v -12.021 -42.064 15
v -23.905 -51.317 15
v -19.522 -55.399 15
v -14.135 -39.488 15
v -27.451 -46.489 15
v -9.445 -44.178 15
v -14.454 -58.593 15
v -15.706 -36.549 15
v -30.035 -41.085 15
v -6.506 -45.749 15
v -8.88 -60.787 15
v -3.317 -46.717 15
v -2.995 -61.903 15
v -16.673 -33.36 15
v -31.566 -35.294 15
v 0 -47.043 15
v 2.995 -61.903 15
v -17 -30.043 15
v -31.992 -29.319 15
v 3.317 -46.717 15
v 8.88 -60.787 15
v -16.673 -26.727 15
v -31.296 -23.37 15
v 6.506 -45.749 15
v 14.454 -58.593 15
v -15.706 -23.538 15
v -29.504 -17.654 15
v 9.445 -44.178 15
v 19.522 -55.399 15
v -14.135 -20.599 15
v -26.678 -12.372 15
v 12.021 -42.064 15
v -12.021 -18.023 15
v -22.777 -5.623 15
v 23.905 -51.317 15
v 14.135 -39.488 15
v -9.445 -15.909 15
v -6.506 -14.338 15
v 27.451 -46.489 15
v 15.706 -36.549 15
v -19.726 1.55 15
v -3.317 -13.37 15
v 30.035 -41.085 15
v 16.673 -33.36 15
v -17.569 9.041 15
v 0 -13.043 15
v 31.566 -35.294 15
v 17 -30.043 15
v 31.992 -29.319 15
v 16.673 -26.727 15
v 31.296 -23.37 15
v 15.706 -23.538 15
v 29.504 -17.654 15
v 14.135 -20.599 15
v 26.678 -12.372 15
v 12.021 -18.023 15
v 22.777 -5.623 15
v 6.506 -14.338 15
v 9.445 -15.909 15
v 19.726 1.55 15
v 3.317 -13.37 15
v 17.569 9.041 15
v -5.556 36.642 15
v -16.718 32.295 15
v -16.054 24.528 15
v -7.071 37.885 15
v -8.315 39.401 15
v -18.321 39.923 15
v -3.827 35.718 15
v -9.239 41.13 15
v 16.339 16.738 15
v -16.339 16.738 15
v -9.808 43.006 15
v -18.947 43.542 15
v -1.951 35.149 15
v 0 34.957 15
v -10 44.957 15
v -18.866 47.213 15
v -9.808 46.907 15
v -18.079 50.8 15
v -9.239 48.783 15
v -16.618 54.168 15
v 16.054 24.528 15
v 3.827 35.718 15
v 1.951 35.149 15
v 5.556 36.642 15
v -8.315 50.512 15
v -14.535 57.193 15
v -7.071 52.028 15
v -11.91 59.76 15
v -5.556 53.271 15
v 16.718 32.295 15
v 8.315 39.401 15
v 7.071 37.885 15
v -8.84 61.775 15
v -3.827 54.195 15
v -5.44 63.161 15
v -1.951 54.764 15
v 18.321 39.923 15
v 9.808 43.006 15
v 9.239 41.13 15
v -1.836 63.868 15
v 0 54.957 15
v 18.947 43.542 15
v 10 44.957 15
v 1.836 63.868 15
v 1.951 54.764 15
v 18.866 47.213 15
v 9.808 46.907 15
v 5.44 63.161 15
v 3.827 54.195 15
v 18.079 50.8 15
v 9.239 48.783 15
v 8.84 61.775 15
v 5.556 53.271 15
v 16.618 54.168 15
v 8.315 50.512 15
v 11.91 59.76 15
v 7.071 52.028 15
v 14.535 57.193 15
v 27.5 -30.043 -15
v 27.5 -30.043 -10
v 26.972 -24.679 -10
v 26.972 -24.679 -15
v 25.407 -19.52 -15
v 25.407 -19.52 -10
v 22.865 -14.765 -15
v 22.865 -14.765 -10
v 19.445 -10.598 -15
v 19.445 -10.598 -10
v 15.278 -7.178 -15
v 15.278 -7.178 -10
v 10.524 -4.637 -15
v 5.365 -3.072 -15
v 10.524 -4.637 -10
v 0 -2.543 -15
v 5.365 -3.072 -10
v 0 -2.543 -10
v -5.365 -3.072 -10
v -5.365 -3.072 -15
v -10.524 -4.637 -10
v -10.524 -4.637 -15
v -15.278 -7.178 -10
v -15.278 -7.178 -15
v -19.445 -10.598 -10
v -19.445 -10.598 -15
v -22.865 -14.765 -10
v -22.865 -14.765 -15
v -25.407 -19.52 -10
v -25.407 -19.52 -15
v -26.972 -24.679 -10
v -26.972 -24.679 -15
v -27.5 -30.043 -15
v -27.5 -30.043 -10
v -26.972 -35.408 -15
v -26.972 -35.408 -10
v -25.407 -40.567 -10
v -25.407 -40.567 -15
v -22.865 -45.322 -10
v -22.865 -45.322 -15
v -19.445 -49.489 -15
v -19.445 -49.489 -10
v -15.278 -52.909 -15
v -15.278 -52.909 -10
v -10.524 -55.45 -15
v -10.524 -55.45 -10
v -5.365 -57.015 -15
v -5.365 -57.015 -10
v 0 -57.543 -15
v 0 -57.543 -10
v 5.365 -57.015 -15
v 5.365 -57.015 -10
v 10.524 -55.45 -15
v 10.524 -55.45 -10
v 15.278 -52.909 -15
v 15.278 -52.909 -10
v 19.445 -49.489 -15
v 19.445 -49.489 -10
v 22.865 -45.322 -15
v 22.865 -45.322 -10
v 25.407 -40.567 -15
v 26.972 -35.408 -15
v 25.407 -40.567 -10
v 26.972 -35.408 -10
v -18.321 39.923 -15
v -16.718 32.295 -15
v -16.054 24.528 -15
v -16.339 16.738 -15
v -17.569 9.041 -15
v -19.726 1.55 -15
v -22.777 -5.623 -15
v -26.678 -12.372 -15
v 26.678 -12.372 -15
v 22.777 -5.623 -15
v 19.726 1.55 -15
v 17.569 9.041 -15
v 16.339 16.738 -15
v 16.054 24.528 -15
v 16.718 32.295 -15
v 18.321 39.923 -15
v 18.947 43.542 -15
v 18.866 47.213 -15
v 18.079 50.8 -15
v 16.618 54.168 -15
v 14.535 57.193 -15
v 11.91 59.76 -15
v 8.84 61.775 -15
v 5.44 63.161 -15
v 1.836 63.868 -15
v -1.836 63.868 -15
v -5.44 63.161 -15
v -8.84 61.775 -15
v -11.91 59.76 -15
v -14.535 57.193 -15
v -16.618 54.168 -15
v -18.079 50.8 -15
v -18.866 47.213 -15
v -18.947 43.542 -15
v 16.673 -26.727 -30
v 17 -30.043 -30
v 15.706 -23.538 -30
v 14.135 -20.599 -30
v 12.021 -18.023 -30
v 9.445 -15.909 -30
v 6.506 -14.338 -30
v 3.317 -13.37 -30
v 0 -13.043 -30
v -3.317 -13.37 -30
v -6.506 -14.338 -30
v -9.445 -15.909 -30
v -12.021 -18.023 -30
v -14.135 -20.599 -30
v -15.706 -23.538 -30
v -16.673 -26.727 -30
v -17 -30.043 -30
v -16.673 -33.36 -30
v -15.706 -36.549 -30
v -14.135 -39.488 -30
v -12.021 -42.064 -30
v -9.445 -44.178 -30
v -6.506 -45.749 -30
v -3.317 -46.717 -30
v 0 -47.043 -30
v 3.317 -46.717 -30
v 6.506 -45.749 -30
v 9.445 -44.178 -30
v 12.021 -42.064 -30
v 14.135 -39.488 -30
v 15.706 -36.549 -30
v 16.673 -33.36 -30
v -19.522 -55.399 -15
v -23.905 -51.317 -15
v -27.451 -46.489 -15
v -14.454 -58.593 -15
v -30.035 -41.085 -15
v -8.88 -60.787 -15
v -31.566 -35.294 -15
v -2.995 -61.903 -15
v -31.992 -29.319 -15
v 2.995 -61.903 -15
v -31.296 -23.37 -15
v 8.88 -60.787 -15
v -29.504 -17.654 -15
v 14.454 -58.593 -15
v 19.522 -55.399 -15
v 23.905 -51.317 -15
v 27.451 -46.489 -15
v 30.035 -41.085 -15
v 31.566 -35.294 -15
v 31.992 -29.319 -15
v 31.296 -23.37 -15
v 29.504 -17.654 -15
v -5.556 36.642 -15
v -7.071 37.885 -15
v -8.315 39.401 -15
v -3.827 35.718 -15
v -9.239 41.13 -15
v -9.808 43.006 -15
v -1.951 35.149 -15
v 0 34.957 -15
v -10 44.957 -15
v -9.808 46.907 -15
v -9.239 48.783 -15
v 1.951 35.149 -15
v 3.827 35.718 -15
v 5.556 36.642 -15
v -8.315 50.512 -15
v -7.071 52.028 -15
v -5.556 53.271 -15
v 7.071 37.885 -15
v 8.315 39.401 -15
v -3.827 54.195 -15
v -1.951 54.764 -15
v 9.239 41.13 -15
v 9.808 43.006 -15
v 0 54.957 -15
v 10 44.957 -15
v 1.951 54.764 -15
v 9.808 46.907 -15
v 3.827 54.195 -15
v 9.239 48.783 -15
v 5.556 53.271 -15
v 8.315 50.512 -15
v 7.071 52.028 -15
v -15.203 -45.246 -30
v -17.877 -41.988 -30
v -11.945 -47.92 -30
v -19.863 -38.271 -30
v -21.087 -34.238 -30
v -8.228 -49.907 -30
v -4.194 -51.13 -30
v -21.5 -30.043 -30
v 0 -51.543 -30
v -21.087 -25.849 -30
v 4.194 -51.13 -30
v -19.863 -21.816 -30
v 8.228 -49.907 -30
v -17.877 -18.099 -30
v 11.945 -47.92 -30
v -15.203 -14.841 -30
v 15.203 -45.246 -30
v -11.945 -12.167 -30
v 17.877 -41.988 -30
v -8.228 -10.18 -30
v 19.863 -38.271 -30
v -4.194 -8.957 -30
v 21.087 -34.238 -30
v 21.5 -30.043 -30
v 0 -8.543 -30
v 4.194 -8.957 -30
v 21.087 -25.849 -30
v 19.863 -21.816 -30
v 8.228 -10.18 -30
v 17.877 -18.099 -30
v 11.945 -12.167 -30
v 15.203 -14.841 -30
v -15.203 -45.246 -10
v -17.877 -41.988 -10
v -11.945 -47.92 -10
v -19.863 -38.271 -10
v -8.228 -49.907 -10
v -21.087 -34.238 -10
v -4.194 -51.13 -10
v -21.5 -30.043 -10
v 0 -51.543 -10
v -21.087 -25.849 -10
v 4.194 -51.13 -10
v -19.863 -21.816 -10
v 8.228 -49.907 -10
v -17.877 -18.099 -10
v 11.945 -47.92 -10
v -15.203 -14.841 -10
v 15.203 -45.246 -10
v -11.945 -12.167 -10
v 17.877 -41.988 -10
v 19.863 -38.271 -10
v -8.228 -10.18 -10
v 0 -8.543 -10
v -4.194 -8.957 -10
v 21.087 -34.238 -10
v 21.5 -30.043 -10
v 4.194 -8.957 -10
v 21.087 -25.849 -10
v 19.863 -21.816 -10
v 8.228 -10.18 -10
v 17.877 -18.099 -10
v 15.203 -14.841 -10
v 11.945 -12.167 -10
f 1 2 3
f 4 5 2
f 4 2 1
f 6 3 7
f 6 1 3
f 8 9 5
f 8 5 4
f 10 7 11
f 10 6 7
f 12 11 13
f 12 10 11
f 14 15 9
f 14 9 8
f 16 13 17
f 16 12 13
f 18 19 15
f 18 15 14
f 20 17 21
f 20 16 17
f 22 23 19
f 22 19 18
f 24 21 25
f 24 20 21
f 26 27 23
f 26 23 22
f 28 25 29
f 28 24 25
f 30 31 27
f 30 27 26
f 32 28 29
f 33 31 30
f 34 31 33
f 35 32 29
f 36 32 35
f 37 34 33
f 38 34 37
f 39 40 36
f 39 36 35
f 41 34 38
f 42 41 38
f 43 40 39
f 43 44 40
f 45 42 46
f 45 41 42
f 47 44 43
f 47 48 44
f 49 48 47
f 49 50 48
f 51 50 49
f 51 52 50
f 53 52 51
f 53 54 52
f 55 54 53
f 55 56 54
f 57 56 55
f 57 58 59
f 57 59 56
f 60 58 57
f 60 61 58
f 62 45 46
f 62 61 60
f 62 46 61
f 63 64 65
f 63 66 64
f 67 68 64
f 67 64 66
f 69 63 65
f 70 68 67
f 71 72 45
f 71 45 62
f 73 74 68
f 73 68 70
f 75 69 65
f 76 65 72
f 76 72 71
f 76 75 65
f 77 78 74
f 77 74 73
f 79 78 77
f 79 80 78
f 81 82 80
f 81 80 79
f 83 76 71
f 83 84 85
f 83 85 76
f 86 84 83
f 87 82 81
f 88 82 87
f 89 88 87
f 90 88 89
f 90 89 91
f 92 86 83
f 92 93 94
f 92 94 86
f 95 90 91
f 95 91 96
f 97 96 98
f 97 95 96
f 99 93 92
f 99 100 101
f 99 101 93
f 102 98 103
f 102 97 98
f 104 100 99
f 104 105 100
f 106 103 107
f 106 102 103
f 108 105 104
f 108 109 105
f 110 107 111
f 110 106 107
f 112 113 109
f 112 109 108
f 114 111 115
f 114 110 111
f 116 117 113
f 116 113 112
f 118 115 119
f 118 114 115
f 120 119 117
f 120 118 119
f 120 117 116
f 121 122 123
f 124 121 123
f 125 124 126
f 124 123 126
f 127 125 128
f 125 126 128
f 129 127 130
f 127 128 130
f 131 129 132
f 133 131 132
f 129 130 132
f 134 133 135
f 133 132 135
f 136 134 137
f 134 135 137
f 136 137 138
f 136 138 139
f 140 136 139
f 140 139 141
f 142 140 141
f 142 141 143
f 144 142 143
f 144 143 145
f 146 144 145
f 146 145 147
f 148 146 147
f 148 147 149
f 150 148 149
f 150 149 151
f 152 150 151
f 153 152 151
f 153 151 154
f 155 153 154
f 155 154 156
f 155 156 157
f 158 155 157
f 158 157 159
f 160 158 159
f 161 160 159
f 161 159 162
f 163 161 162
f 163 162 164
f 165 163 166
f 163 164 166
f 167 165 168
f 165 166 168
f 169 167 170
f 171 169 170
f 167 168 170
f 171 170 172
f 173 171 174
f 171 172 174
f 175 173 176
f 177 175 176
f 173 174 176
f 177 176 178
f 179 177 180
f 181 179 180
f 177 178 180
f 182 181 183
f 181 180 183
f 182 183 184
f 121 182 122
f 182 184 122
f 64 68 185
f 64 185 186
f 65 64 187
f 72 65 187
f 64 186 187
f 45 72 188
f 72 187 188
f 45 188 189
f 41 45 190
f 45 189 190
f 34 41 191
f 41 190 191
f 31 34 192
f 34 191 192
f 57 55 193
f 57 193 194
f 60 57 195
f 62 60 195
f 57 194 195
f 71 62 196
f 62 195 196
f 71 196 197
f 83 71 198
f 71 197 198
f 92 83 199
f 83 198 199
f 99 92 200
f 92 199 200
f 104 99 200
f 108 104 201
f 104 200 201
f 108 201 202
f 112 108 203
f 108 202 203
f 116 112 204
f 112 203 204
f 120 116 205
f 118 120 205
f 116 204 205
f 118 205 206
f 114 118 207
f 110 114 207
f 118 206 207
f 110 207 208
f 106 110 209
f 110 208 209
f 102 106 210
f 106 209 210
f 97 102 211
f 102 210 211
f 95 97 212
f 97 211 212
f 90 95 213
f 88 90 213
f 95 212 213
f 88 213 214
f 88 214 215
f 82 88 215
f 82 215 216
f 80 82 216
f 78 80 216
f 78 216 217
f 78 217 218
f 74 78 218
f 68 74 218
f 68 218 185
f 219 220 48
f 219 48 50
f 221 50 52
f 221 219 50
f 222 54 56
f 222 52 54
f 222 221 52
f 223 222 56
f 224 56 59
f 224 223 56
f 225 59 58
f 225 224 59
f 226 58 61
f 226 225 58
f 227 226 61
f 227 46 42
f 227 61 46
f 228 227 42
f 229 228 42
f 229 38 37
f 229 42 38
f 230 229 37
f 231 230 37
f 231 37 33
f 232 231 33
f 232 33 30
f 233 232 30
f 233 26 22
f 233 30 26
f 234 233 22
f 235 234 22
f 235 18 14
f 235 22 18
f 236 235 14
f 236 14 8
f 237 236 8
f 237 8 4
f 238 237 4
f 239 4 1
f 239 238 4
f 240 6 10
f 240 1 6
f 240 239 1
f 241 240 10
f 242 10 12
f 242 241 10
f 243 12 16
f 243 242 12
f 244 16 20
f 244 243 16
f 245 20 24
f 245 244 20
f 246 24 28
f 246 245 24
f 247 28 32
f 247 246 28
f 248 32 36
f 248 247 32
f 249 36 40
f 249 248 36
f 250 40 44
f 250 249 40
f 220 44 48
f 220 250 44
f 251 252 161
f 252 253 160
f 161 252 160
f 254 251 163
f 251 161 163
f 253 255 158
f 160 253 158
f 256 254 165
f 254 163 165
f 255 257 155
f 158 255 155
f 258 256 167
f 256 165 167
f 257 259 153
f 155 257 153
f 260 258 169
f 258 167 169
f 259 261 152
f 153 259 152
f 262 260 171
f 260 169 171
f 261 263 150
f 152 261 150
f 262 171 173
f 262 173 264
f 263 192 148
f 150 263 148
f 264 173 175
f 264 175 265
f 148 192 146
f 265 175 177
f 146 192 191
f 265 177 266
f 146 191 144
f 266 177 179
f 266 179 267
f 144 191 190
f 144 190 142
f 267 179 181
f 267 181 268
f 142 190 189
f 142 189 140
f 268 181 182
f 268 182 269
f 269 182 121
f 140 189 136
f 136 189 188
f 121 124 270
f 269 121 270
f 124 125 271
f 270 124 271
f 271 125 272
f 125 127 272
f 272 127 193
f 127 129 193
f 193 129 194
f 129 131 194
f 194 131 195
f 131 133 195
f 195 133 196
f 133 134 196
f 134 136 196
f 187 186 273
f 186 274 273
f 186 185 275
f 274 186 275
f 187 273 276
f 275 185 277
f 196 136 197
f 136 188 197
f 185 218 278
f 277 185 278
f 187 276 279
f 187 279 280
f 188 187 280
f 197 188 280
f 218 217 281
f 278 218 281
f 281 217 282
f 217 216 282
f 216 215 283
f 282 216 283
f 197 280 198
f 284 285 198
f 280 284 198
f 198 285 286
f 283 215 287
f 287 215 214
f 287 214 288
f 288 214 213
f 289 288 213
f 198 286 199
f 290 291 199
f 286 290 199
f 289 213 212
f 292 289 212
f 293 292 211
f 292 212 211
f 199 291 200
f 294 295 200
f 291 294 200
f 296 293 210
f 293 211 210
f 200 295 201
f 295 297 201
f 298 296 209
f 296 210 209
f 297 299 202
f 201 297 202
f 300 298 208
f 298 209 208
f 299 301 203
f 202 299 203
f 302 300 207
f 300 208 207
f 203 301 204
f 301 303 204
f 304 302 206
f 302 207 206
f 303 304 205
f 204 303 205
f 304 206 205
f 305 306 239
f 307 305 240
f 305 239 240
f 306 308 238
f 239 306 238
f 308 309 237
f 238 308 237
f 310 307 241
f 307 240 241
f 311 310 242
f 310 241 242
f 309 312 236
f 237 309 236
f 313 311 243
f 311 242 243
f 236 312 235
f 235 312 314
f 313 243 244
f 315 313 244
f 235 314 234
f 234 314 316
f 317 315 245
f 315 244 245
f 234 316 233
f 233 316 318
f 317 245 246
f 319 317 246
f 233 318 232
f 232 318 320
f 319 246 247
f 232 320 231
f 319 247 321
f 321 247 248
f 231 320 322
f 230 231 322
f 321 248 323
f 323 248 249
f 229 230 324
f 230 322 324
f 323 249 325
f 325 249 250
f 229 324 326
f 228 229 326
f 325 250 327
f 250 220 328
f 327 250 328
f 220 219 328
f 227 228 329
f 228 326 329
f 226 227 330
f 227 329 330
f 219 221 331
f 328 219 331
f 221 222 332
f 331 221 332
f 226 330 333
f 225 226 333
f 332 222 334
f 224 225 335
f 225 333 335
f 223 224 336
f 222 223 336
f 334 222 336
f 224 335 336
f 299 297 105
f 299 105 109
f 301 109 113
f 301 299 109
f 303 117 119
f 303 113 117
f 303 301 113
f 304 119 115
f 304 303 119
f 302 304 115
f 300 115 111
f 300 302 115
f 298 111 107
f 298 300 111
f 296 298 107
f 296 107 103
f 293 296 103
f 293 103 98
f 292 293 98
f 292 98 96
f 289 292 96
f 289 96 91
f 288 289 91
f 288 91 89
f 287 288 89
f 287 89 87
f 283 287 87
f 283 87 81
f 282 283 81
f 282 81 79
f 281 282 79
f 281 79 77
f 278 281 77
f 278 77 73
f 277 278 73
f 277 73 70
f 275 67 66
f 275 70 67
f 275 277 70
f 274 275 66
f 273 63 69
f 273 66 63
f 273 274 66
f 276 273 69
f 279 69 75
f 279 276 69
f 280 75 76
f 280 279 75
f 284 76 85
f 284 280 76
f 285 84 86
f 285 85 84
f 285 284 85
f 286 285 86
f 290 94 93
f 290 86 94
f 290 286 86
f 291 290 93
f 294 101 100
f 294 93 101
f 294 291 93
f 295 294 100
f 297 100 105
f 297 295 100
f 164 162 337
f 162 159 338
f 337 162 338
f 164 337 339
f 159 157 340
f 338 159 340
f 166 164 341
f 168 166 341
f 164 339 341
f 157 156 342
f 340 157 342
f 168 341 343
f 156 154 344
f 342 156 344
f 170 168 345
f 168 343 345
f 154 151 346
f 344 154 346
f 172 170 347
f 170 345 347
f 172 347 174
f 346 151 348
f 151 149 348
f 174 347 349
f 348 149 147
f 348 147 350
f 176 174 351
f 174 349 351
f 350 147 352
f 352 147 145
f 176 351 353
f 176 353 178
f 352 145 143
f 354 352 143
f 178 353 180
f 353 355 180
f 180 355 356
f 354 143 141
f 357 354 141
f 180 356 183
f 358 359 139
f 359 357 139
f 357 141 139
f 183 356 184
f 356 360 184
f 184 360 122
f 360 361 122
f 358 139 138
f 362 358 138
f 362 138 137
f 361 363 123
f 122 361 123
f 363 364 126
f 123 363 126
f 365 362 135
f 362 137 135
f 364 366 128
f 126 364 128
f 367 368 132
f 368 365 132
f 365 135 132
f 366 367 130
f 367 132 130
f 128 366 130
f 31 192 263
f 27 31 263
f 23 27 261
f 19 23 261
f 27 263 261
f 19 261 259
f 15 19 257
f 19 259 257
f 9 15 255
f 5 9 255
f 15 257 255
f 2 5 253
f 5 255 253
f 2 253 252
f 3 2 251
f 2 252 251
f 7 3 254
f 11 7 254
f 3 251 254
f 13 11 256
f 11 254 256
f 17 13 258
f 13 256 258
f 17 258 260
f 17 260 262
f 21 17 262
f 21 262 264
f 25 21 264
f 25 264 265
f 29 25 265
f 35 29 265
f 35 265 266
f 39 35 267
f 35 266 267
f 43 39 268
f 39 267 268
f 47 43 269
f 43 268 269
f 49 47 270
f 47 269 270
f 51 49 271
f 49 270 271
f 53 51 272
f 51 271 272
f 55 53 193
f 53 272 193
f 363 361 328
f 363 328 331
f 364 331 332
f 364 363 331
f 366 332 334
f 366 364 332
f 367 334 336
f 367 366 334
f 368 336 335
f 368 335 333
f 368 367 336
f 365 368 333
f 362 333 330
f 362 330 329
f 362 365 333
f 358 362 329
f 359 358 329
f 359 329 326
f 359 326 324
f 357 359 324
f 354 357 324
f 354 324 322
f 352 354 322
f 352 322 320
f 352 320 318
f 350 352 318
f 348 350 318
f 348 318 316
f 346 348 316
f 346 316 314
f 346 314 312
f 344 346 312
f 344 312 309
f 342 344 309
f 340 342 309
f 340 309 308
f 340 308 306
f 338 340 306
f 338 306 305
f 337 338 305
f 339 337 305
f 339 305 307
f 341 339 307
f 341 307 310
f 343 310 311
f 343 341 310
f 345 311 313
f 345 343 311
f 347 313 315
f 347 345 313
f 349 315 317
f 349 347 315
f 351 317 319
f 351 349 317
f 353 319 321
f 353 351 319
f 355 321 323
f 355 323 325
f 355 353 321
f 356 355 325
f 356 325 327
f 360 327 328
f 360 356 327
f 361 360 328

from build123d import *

# Parameters (mm, degrees)
Y_KSEKLIK_EKSTR_ZYON1_DEPTH      = 15
Y_KSEKLIK_EKSTR_ZYON1_DEPTH_BACK = 15
KES_EKSTR_ZYON2_START            = -10
IZIM1_8_R                        = 27.5
IZIM1_8_R_2                      = 21.5
KES_EKSTR_ZYON2_DEPTH            = 39
IZIM1_11_R                       = 21.5
Y_KSEKLIK_EKSTR_ZYON4_DEPTH      = 30
KES_EKSTR_ZYON3_DEPTH            = 26
KES_EKSTR_ZYON3_DEPTH_BACK       = 47
IZIM1_12_R                       = 17
KES_EKSTR_ZYON4_DEPTH            = 47
KES_EKSTR_ZYON4_DEPTH_BACK       = 47
IZIM1_13_R                       = 10


with BuildPart() as part:
    # Çizim1 → Yükseklik-Ekstrüzyon1 (new, two sides: drawn at the far end of the back side and taken through both)
    with BuildSketch(Plane.XY.offset(-Y_KSEKLIK_EKSTR_ZYON1_DEPTH_BACK)):
        with BuildLine():
            ThreePointArc((-26.678302647, -12.37237703), (0, -62.043488141), (26.678302647, -12.37237703))
            ThreePointArc((26.678302647, -12.37237703), (16.836772686, 12.870553113), (18.321243986, 39.923419489))
            ThreePointArc((18.321243986, 39.923419489), (0, 63.956511859), (-18.321243986, 39.923419489))
            ThreePointArc((-18.321243986, 39.923419489), (-16.836772686, 12.870553113), (-26.678302647, -12.37237703))
        make_face()
    extrude(amount=Y_KSEKLIK_EKSTR_ZYON1_DEPTH + Y_KSEKLIK_EKSTR_ZYON1_DEPTH_BACK)

    # Çizim1<8> → Kes-Ekstrüzyon2 (cut)
    with BuildSketch(Plane.XY.offset(KES_EKSTR_ZYON2_START)):
        with Locations((0, -30.043488141)):
            Circle(IZIM1_8_R)
        with Locations((0, -30.043488141)):
            Circle(IZIM1_8_R_2, mode=Mode.SUBTRACT)
    extrude(amount=-KES_EKSTR_ZYON2_DEPTH, mode=Mode.SUBTRACT)

    # Çizim1<11> → Yükseklik-Ekstrüzyon4 (add)
    with BuildSketch(Plane.XY):
        with Locations((0, -30.043488141)):
            Circle(IZIM1_11_R)
    extrude(amount=-Y_KSEKLIK_EKSTR_ZYON4_DEPTH)

    # Çizim1<12> → Kes-Ekstrüzyon3 (cut, two sides: drawn at the far end of the back side and taken through both)
    with BuildSketch(Plane.XY.offset(-KES_EKSTR_ZYON3_DEPTH_BACK)):
        with Locations((0, -30.043488141)):
            Circle(IZIM1_12_R)
    extrude(amount=KES_EKSTR_ZYON3_DEPTH + KES_EKSTR_ZYON3_DEPTH_BACK, mode=Mode.SUBTRACT)

    # Çizim1<13> → Kes-Ekstrüzyon4 (cut, two sides: drawn at the far end of the back side and taken through both)
    with BuildSketch(Plane.XY.offset(-KES_EKSTR_ZYON4_DEPTH_BACK)):
        with Locations((0, 44.956511859)):
            Circle(IZIM1_13_R)
    extrude(amount=KES_EKSTR_ZYON4_DEPTH + KES_EKSTR_ZYON4_DEPTH_BACK, mode=Mode.SUBTRACT)


solid = part.part
